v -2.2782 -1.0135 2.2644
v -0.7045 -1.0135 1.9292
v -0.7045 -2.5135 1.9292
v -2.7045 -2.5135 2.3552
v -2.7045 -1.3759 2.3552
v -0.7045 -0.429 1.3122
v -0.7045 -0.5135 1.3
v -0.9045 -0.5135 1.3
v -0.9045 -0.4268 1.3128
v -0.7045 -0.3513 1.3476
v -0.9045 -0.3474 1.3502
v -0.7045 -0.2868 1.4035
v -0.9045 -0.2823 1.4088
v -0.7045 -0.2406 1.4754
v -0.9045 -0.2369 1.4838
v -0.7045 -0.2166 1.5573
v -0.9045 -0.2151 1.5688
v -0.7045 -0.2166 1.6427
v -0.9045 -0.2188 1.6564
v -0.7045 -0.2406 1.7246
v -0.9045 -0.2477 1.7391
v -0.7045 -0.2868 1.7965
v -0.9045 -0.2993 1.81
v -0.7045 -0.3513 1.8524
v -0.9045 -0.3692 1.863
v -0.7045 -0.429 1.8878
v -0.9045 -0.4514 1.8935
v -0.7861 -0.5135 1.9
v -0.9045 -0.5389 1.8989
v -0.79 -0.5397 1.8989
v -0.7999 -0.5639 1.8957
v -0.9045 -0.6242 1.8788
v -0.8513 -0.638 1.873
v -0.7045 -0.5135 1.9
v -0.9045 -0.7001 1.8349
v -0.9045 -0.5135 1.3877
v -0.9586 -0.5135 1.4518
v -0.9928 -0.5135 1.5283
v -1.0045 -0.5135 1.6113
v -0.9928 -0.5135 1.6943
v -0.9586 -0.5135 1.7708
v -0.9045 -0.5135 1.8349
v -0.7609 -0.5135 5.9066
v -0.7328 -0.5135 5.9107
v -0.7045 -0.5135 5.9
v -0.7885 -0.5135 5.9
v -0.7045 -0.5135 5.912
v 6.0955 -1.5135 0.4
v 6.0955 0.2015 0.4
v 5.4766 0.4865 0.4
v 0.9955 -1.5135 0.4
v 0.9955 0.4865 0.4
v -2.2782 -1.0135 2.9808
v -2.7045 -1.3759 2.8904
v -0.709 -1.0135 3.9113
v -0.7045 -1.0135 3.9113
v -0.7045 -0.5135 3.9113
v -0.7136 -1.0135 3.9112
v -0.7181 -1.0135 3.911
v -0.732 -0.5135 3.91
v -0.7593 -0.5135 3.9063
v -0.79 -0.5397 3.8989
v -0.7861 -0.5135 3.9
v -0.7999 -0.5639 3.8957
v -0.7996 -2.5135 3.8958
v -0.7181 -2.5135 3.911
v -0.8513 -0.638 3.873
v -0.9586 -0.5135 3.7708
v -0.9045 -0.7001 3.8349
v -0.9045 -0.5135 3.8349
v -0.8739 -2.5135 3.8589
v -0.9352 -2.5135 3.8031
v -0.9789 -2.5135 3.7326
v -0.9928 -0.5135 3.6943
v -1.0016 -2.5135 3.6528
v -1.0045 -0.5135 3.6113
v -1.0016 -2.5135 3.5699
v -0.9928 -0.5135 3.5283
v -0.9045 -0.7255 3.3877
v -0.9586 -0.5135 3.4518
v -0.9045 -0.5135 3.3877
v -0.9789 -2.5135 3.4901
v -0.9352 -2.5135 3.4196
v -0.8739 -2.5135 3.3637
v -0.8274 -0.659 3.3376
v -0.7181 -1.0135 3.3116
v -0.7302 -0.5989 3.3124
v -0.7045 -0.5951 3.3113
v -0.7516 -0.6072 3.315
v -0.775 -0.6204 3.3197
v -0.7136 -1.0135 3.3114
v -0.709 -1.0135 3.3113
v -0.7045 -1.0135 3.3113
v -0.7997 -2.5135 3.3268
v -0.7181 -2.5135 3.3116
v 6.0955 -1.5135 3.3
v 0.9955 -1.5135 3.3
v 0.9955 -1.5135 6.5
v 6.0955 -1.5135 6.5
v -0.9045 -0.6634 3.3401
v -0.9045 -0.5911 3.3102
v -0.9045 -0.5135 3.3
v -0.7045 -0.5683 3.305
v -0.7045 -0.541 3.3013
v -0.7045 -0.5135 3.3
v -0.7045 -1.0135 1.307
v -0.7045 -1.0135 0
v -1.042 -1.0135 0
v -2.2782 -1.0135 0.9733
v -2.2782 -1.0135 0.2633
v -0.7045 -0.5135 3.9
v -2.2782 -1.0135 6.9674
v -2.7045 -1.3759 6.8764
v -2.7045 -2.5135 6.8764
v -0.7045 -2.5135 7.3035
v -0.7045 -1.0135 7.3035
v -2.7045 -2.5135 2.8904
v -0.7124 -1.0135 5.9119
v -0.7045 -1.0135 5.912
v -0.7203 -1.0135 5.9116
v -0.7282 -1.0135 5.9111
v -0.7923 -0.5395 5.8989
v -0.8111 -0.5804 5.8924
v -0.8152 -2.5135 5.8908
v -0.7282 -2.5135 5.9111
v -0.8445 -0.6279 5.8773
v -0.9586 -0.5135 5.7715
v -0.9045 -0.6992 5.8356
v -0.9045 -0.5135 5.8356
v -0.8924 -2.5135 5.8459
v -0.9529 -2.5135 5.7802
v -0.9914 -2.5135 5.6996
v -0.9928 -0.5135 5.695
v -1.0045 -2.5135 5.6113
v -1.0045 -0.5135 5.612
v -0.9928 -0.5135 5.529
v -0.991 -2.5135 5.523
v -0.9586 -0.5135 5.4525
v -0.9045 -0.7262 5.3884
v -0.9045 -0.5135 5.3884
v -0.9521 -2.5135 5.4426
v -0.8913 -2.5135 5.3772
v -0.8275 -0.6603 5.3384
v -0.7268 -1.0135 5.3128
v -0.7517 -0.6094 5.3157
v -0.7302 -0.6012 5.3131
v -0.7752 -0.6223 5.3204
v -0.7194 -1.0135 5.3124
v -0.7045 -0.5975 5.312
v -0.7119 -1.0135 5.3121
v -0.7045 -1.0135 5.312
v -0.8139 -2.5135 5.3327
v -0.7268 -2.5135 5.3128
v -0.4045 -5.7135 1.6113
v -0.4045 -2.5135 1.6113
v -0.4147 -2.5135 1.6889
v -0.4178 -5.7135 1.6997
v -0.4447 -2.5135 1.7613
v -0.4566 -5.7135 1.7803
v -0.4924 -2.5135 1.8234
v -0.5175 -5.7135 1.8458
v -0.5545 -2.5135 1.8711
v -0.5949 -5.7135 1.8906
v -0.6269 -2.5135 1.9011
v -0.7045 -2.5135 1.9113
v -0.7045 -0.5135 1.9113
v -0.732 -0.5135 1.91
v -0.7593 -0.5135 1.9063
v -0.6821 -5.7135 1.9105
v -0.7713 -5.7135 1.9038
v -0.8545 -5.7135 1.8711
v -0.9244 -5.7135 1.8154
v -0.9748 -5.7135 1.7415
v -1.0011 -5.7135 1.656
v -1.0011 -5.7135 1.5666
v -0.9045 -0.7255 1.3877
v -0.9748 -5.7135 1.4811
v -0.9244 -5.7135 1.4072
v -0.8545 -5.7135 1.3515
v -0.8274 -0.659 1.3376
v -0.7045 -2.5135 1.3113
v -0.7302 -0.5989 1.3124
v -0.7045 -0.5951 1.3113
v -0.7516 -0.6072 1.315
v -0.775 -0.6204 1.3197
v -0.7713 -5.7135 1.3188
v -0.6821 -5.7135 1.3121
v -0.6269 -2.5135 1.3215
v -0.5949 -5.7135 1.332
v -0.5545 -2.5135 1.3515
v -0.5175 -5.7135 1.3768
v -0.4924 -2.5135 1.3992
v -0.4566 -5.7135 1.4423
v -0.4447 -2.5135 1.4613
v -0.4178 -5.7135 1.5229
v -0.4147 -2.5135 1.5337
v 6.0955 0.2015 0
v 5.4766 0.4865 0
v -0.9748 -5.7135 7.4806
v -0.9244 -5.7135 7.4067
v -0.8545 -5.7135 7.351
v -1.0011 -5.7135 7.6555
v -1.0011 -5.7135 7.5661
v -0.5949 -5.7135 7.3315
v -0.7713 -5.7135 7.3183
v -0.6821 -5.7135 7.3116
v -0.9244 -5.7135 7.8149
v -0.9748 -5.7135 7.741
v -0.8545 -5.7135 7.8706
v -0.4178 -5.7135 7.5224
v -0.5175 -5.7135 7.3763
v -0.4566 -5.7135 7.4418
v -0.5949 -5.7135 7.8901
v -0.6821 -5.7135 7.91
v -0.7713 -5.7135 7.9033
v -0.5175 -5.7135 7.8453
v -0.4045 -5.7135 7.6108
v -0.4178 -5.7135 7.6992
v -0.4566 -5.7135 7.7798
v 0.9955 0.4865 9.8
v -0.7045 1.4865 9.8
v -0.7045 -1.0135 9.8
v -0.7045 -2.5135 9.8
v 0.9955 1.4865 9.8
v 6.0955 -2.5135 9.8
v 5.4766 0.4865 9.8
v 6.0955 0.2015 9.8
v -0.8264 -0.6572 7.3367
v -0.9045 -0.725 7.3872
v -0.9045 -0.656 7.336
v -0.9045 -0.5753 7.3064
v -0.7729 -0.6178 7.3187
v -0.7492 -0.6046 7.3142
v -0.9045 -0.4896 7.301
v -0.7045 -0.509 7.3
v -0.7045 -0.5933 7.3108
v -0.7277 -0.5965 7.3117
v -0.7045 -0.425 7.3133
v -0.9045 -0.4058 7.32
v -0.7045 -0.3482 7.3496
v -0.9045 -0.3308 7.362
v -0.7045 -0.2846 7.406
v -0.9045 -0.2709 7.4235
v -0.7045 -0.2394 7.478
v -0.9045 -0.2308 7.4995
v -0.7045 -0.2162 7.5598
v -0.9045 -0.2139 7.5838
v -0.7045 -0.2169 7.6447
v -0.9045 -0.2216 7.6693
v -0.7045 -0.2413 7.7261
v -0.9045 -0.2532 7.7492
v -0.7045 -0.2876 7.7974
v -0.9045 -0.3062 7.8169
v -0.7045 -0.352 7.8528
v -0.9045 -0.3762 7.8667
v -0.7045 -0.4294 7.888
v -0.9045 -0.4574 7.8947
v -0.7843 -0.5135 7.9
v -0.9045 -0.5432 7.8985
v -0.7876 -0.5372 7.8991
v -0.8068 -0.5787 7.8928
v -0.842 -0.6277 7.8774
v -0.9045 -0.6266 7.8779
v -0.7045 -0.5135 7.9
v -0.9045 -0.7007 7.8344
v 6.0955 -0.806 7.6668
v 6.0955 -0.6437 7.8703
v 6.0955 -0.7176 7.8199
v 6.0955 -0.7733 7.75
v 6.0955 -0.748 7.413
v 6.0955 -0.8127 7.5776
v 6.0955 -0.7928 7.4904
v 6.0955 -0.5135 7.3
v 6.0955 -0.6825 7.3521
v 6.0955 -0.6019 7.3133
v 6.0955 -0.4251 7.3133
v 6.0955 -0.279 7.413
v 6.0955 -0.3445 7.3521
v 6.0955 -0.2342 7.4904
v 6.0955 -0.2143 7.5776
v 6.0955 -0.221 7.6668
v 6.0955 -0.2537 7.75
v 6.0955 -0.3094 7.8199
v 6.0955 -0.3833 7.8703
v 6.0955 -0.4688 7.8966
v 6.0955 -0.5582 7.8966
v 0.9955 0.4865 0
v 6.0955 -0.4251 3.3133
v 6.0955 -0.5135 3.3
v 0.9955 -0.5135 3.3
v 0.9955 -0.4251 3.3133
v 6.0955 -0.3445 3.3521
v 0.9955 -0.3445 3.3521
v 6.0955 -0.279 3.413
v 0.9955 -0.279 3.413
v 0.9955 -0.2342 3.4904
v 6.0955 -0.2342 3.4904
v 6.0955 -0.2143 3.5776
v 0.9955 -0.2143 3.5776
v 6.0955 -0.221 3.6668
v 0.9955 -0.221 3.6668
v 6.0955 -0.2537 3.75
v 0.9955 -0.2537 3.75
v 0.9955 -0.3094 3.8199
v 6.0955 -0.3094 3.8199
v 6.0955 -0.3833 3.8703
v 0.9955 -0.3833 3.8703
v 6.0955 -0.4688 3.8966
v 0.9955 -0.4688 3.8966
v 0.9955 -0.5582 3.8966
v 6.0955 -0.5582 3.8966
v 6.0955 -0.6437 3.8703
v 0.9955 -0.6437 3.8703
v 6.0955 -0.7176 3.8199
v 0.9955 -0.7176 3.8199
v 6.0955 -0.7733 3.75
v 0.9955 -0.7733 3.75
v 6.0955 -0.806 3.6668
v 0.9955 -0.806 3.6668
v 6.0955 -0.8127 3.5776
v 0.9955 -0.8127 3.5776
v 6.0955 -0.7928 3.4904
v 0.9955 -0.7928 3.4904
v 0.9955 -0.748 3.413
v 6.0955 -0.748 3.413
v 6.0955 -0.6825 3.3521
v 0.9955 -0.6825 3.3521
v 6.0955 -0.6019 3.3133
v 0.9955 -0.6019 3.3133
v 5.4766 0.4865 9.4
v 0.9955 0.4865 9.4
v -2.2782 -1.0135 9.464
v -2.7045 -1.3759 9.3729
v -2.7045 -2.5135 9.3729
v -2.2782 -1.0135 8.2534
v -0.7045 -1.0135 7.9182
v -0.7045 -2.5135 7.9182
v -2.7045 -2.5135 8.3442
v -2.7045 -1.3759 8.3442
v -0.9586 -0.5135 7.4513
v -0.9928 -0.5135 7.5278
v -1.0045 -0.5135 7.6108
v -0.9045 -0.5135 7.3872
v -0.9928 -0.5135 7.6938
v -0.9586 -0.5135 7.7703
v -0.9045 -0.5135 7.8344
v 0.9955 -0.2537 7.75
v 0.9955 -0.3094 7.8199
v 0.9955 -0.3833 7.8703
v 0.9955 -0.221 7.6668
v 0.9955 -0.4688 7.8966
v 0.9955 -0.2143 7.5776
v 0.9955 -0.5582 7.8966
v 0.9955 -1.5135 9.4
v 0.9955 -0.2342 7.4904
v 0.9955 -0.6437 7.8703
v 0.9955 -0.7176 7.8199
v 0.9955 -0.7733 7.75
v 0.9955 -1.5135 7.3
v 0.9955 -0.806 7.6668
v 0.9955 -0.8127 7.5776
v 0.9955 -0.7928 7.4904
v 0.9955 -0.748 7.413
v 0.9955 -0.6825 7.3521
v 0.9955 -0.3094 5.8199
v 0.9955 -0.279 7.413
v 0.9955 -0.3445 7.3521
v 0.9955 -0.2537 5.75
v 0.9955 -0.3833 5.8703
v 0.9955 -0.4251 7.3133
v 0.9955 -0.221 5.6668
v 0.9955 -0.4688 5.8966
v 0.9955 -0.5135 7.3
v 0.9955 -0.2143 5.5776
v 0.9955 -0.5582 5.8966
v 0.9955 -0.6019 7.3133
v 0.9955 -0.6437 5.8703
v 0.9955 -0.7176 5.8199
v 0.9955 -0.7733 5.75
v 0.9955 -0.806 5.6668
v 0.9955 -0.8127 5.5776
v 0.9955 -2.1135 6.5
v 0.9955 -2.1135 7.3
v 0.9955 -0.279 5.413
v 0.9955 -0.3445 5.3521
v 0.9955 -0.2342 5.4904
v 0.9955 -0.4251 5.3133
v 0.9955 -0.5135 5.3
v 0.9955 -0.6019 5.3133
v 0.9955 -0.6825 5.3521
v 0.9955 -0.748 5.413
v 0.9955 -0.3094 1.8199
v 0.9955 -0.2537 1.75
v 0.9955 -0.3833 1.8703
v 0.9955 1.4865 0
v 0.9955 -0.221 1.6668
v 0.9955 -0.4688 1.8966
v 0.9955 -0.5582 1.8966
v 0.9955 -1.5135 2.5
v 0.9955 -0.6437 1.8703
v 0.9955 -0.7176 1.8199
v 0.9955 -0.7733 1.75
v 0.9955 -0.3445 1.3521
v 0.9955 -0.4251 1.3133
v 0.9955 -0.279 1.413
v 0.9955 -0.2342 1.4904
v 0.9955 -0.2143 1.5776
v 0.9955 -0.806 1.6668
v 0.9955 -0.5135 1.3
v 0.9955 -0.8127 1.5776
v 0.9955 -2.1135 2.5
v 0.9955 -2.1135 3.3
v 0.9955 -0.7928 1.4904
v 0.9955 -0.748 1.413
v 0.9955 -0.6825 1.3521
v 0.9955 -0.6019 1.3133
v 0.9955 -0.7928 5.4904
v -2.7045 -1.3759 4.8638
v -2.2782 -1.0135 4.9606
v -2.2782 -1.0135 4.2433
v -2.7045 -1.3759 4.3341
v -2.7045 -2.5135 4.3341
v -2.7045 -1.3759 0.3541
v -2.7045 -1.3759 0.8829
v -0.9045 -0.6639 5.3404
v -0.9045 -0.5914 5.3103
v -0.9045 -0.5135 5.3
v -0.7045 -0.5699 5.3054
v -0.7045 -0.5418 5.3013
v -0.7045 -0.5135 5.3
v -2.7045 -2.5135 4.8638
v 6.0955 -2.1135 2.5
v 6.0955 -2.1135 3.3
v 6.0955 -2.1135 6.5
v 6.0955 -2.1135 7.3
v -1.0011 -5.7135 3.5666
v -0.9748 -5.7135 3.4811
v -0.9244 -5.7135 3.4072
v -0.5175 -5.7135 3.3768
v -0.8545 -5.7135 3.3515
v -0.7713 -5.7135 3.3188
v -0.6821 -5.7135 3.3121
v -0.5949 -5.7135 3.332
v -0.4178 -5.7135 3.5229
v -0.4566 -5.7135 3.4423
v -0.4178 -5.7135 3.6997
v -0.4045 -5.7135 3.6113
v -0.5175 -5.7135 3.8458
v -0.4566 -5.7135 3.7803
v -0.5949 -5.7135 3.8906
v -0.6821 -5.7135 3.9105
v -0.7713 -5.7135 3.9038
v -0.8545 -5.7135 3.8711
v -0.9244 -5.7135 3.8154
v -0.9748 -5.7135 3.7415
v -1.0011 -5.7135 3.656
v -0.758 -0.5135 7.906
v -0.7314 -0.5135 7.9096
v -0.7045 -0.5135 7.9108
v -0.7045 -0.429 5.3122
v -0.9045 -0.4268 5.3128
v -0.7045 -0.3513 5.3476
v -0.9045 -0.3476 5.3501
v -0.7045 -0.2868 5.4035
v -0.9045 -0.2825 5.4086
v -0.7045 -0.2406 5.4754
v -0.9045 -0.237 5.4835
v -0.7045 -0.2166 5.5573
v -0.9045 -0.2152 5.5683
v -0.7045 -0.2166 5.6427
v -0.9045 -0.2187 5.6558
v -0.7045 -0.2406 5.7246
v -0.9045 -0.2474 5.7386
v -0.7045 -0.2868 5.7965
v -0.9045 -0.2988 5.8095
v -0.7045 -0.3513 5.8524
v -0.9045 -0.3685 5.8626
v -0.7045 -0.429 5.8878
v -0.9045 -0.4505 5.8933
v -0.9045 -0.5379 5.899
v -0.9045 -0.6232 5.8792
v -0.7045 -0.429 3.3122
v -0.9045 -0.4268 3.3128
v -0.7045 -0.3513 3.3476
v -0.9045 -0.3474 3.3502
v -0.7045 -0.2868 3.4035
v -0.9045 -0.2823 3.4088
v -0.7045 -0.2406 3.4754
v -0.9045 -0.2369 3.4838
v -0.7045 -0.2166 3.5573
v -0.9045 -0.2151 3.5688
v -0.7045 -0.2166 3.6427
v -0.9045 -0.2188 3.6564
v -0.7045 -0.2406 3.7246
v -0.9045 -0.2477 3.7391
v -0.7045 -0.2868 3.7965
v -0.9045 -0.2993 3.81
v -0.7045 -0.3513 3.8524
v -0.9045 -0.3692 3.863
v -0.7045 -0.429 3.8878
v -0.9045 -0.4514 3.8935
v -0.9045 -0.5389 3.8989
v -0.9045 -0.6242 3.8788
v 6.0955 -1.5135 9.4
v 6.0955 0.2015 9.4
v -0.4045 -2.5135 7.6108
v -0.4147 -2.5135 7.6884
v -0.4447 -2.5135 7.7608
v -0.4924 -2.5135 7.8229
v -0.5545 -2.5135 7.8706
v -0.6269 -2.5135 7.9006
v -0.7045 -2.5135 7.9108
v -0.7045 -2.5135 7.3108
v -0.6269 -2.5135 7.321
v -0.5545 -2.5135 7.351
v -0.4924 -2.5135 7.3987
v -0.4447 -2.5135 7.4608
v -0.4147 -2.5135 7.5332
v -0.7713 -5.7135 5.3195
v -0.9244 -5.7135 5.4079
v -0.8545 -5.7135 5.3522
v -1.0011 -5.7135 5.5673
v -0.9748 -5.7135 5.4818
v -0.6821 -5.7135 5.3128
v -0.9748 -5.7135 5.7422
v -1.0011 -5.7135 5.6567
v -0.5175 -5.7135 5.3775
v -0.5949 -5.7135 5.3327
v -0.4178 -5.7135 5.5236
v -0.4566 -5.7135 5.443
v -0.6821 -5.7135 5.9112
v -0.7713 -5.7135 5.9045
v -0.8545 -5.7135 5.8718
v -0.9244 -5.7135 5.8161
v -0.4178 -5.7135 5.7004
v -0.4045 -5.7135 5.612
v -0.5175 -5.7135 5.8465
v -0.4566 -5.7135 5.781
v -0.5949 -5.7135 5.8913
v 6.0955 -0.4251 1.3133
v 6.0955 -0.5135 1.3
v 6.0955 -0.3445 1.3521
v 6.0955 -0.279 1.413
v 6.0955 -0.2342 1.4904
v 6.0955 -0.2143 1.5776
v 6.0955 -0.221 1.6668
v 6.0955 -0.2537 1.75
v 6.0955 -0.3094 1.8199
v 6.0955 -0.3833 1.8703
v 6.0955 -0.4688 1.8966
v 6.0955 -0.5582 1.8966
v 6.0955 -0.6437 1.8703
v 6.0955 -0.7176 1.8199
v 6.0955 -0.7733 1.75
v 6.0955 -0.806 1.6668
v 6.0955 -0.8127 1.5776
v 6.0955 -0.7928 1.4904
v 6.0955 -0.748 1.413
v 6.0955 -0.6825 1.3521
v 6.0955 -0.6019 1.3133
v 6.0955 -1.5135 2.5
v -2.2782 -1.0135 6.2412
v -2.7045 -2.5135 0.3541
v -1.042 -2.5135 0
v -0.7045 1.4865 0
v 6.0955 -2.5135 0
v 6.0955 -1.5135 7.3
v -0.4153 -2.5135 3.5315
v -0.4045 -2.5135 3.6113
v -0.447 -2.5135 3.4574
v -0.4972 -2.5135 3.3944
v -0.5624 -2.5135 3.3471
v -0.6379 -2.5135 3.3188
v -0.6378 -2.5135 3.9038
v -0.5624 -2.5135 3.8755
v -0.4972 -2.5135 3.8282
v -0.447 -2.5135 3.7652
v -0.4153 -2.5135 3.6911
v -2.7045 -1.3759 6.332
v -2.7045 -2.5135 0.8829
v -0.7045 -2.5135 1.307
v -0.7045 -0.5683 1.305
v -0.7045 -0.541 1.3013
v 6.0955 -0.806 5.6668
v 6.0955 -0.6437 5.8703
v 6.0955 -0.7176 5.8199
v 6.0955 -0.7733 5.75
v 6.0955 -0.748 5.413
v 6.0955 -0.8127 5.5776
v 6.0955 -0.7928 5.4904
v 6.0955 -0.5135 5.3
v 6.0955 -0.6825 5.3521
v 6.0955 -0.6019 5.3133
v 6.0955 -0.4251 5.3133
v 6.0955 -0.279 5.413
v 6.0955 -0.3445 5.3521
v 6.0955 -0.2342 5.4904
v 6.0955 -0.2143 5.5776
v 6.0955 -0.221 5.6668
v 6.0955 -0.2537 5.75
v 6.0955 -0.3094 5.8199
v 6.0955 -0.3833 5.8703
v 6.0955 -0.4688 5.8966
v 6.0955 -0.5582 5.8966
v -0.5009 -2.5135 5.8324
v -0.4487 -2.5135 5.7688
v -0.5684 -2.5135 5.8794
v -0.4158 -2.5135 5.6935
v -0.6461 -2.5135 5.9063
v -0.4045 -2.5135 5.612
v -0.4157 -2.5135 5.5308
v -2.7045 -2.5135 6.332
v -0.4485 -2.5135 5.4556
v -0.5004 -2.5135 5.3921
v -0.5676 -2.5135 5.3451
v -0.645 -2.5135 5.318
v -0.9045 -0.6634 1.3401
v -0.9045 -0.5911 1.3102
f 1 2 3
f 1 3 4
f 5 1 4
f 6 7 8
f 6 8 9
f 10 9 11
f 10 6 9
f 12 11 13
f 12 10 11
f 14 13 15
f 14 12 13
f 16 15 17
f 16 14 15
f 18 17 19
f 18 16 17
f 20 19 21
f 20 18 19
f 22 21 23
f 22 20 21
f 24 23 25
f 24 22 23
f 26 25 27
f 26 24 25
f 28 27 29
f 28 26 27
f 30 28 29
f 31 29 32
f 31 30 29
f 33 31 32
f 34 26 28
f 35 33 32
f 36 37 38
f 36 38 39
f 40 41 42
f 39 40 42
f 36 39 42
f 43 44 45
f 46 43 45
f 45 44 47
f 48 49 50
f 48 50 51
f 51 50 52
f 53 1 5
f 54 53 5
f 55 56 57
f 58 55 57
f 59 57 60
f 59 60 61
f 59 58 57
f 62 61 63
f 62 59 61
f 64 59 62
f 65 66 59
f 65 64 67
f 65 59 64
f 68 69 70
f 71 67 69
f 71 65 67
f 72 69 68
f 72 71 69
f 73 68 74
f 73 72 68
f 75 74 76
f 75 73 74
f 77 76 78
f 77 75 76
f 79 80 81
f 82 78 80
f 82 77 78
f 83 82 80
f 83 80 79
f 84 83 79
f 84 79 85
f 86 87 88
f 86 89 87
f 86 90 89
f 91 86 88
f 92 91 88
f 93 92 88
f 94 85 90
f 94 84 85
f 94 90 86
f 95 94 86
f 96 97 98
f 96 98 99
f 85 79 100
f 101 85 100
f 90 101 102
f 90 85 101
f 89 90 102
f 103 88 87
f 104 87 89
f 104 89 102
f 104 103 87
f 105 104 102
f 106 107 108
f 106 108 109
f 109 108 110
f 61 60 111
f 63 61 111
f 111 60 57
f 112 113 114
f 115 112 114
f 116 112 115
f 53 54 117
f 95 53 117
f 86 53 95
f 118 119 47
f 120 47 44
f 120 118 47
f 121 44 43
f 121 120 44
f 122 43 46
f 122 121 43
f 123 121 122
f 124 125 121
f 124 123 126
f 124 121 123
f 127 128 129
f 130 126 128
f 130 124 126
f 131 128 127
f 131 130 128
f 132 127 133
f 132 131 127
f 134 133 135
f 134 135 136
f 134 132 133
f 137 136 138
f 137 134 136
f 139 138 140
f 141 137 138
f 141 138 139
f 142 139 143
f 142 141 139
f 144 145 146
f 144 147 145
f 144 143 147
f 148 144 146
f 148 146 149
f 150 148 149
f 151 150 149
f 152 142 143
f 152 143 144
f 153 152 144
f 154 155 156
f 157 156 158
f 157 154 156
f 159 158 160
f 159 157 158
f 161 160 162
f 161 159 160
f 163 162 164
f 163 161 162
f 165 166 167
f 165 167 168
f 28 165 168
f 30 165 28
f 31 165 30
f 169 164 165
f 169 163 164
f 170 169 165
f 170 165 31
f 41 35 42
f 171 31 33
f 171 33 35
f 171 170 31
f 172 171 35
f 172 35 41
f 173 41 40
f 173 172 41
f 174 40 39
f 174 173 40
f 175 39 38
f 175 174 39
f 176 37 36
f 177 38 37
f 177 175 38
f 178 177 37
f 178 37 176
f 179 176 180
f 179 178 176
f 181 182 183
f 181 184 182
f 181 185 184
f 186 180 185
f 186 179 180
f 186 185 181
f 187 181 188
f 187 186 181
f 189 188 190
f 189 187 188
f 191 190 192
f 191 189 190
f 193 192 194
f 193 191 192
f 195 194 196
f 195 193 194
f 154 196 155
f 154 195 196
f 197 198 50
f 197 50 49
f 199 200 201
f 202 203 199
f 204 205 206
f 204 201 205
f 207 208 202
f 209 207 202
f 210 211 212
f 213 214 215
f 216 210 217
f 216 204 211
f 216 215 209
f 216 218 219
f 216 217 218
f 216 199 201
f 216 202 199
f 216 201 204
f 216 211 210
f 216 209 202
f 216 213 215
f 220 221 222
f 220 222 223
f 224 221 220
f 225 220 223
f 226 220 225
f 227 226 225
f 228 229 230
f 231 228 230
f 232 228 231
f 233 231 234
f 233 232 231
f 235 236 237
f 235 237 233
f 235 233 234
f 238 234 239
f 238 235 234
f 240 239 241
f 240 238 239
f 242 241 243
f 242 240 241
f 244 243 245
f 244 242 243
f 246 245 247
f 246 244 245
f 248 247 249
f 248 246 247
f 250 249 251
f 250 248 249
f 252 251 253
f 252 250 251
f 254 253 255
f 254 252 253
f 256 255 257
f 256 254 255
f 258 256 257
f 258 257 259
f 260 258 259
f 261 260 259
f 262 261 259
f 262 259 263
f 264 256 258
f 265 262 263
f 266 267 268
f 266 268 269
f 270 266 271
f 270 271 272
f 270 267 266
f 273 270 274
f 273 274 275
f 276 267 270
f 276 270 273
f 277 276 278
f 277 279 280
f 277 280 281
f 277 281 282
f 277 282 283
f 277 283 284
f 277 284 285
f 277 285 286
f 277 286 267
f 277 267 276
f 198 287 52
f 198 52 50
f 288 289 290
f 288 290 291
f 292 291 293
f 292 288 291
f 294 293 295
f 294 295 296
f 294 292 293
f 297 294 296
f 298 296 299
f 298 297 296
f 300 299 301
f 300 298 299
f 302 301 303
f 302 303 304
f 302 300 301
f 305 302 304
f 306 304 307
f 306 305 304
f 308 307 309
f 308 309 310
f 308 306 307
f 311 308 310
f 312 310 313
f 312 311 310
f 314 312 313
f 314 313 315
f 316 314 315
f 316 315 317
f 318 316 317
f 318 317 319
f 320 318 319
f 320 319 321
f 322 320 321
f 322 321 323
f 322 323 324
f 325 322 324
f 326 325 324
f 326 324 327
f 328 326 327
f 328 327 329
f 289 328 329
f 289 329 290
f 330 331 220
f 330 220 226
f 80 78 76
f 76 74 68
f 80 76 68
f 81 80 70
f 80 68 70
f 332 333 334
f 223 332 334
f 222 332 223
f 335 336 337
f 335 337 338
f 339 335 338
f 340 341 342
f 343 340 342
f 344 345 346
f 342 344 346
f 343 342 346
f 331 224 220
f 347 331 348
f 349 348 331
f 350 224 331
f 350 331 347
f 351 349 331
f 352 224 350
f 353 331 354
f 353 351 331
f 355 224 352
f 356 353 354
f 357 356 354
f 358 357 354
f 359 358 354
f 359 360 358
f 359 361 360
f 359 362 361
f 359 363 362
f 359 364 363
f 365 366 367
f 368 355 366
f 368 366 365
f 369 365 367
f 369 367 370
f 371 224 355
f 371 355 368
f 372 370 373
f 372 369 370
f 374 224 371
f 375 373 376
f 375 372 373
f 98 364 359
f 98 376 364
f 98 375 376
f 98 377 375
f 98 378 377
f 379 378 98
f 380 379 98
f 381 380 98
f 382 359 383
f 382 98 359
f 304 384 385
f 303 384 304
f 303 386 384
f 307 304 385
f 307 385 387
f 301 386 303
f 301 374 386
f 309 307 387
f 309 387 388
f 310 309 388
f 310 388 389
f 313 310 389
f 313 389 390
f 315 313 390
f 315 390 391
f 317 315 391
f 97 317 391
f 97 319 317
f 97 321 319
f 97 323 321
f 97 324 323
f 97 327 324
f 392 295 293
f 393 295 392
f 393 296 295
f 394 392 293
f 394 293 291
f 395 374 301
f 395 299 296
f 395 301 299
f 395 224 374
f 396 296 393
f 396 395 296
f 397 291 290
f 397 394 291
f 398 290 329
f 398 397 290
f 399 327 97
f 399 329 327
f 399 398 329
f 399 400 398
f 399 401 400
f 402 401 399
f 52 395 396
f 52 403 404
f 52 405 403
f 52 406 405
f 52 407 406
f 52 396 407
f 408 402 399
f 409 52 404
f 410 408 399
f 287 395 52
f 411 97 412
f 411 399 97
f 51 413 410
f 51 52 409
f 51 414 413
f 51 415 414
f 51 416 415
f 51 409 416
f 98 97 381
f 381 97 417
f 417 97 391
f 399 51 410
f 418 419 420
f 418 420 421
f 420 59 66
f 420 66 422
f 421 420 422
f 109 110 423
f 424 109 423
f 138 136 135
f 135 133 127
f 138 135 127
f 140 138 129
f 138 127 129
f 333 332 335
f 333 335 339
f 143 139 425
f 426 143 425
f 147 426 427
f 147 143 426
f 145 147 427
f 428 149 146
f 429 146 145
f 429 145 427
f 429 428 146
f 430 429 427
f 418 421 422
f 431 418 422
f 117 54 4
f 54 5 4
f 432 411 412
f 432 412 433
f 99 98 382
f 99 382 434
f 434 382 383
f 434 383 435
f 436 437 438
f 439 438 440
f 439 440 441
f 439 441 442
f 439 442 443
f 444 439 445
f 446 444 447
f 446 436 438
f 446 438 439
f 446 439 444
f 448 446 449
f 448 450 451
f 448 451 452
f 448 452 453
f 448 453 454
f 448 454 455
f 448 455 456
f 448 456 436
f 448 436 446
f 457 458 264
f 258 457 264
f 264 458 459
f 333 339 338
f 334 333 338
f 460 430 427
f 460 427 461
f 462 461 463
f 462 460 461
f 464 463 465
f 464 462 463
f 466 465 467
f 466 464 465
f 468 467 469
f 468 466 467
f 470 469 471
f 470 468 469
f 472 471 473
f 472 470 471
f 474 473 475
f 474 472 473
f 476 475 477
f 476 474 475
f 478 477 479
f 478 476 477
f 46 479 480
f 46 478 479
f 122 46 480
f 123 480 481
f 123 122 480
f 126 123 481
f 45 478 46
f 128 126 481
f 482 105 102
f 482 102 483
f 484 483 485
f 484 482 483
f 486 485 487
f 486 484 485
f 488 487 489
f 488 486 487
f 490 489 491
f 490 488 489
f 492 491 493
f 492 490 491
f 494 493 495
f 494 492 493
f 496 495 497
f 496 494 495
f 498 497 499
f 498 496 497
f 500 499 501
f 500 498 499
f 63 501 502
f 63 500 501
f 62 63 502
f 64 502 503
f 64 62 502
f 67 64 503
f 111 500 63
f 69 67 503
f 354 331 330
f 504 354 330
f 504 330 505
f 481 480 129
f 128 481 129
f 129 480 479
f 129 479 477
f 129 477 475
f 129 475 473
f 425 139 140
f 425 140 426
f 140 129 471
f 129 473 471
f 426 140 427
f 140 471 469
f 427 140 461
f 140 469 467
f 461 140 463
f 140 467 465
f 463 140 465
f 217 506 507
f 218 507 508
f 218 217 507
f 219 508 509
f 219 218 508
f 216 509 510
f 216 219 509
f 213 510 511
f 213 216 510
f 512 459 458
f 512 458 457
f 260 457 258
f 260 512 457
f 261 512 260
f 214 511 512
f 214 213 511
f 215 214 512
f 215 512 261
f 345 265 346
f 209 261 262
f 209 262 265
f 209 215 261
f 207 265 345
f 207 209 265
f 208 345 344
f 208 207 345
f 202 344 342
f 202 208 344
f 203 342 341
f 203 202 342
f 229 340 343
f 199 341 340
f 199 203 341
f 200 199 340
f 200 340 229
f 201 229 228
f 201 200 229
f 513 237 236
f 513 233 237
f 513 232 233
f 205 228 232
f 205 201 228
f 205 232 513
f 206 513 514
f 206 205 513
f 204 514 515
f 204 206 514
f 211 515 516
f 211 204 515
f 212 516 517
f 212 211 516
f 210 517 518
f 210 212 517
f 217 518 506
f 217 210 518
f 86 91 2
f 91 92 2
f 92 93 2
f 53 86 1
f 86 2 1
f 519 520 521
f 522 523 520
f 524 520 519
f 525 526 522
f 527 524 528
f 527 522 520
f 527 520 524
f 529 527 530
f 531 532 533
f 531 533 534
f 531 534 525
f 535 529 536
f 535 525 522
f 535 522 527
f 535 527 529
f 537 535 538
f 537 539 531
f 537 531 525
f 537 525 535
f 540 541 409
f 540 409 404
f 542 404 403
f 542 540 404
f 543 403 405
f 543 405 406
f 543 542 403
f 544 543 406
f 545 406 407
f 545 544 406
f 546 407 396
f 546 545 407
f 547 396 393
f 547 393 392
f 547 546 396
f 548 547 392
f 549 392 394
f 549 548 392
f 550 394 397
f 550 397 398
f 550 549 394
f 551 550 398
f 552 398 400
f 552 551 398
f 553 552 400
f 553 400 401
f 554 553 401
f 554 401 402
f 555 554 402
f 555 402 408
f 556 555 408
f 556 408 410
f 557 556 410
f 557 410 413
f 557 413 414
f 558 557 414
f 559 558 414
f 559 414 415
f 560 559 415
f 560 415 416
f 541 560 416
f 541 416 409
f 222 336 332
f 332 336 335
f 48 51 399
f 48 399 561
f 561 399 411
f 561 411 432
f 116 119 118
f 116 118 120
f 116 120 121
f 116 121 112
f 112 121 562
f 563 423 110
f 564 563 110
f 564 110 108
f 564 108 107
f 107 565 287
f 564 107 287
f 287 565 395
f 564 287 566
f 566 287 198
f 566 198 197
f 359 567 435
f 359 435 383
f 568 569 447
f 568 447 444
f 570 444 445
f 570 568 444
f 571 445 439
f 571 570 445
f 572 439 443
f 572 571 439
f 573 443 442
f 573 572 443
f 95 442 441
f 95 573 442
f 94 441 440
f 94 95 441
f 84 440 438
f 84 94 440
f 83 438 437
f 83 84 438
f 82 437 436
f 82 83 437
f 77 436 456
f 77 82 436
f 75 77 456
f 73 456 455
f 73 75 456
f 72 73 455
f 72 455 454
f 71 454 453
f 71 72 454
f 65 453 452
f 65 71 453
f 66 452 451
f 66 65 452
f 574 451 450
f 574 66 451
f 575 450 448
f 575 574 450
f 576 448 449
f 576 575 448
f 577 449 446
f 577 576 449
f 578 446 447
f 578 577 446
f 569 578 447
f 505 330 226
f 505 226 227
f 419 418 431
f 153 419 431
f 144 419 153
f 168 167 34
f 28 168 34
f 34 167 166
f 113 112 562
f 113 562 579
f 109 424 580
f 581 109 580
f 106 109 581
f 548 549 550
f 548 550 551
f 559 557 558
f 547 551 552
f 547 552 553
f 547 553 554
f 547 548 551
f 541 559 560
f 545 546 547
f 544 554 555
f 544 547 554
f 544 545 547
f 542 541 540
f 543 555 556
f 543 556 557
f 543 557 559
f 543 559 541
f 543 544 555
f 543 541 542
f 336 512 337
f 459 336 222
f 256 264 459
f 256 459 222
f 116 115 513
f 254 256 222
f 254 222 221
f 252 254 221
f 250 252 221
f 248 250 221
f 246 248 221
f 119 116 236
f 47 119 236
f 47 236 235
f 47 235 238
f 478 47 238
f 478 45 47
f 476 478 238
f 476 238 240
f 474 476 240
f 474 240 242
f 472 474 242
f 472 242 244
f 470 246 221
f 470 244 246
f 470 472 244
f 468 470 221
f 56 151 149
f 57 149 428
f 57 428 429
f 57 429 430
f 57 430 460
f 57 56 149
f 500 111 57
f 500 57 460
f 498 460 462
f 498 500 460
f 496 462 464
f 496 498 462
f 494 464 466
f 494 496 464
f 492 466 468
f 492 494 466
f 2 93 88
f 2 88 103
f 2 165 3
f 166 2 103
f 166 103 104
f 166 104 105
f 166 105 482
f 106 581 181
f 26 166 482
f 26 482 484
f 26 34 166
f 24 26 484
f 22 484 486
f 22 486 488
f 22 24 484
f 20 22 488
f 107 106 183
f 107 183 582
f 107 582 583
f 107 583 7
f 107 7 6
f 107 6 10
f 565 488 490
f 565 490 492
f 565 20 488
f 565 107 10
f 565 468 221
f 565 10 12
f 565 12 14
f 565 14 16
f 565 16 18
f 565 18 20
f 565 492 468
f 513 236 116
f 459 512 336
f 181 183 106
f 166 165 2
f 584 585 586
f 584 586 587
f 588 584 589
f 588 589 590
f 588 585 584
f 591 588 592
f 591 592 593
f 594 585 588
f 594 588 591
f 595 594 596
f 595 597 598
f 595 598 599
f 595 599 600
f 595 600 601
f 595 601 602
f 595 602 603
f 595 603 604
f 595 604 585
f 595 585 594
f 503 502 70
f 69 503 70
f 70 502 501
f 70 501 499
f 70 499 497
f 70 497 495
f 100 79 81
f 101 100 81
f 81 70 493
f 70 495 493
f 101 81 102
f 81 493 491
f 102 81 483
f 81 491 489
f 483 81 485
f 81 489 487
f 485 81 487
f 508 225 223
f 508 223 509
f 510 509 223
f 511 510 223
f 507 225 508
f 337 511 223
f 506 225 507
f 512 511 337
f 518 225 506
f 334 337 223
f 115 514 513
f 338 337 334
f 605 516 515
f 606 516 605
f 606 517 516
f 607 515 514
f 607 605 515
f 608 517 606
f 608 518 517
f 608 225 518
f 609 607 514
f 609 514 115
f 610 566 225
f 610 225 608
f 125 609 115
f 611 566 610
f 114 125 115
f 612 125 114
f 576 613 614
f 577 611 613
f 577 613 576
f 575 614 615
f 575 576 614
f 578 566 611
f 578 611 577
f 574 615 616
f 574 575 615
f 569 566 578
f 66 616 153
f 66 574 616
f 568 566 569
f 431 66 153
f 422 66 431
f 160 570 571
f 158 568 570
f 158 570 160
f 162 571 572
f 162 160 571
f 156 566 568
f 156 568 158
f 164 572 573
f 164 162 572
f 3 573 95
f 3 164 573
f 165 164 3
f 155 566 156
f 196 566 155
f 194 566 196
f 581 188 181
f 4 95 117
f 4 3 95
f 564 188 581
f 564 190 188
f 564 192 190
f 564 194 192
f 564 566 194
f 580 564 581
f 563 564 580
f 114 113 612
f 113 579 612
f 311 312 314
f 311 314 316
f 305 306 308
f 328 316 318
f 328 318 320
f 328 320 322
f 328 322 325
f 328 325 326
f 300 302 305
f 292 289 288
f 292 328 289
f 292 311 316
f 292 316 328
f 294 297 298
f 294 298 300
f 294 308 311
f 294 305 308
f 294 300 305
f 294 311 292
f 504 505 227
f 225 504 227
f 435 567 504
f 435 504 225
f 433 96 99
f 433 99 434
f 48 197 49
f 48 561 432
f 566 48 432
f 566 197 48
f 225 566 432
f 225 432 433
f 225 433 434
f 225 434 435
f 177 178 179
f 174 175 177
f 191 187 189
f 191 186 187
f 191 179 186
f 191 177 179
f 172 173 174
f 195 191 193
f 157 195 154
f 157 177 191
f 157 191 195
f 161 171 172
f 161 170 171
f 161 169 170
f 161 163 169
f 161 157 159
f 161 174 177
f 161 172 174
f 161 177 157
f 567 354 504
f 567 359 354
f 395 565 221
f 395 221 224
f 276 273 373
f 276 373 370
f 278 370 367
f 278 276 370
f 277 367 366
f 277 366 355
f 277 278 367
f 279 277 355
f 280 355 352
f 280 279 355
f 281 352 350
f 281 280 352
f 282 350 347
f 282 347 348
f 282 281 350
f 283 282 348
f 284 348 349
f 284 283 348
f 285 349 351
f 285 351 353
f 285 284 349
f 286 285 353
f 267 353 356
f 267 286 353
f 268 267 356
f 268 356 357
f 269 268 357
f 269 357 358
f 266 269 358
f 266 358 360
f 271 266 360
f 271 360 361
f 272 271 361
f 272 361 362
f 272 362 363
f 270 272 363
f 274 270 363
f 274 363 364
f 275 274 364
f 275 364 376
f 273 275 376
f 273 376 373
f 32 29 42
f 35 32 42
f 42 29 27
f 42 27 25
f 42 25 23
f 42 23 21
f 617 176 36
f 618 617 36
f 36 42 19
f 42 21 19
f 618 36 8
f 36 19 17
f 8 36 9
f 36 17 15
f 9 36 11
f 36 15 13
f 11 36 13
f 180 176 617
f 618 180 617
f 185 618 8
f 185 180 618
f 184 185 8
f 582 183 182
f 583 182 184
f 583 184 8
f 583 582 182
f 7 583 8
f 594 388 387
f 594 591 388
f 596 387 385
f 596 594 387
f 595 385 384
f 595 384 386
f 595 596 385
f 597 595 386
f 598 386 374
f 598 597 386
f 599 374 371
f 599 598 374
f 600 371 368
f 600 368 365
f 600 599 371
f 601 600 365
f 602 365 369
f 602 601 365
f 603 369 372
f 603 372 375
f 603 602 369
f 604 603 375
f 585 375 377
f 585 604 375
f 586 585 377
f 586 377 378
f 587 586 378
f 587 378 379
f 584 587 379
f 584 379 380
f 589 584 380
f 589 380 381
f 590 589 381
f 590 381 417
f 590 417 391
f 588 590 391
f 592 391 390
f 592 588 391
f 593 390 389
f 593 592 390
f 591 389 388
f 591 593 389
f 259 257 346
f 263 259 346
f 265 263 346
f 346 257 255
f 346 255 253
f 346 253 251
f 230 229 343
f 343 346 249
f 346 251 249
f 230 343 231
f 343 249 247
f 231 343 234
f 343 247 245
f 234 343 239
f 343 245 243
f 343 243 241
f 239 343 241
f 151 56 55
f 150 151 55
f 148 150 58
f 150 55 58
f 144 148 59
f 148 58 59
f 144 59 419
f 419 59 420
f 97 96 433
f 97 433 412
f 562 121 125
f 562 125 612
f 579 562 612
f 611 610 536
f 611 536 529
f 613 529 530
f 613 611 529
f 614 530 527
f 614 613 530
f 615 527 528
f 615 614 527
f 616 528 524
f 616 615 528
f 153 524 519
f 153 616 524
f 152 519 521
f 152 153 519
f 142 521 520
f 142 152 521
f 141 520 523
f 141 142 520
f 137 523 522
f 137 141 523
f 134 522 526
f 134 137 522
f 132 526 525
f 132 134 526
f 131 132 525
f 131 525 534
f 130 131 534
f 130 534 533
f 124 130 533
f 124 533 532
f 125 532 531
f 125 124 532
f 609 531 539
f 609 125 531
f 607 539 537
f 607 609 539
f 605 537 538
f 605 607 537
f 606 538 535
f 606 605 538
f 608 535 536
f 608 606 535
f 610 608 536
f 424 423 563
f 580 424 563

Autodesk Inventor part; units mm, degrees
ref_plane "YZ Plane" through (0, 0, 0) normal (1, 0, 0) x (0, 1, 0)
ref_plane "XZ Plane" through (0, 0, 0) normal (0, 1, 0) x (-1, 0, 0)
ref_plane "XY Plane" through (0, 0, 0) normal (0, 0, 1) x (1, 0, 0)
sketch "Sketch1" plane through (0, 0, 0) normal (0, 0, 1) x (1, 0, 0)
  line L0 (-0.7045, 1.4865) -> (6.0955, 1.4865)
  line L1 (6.0955, 1.4865) -> (6.0955, -2.5135)
  line L2 (6.0955, -2.5135) -> (-0.7045, -2.5135)
  line L3 (-0.7045, -2.5135) -> (-0.7045, 1.4865)
  line L4 (0.9955, 1.4865) -> (0.9955, 0.4865)
  line L5 (0.9955, 0.4865) -> (5.4766, 0.4865)
  line L6 (5.4766, 0.4865) -> (6.0955, 0.2015)
  line L7 (-0.7045, -1.0135) -> (-2.2782, -1.0135)
  line L8 (-2.2782, -1.0135) -> (-2.7045, -1.3759)
  line L9 (-2.7045, -1.3759) -> (-2.7045, -2.5135)
  line L10 (-2.7045, -2.5135) -> (-0.7045, -2.5135)
  point P0 (0, 0)
  dimension "d0" = 6.8
  dimension "d1" = 4
  dimension "d2" = 1.7
  dimension "d3" = 1
  dimension "d4" = 8.8
  dimension "d5" = 1.5
extrude "Extrusion1" add sketch "Sketch1" along normal blind 9.8 contours L0 L4 L5 L6 L1 L2 L3 | L3 L10 L9 L8 L7
sketch "Sketch2" plane through (0.9955, 0.4865, 0) normal (0, 1, 0) x (1, 0, 0)
  line L0 (0, 0) -> (0, -9.8) projected
  line L1 (4.4812, -9.8) -> (0, -9.8) projected
  line L2 (6, -0.4) -> (0, -0.4)
  line L3 (0, -0.4) -> (0, -9.4)
  line L4 (0, -9.4) -> (6, -9.4)
  line L5 (6, -9.4) -> (6, -0.4)
  point P0 (-0.9955, 0)
  dimension "d8" = 9
  dimension "d9" = 0.4
  dimension "d10" = 6
extrude "Extrusion2" cut sketch "Sketch2" against normal blind 2
sketch "Sketch3" plane through (0.9955, -1.5135, 0) normal (0, 1, 0) x (1, 0, 0)
  line L0 (0, -9.4) -> (0, -0.4) projected
  line L1 (0, -6.5) -> (5.6296, -6.5)
  line L2 (5.6296, -6.5) -> (5.6296, -7.3)
  line L3 (5.6296, -7.3) -> (0, -7.3)
  line L4 (0, -7.3) -> (0, -6.5)
  line L5 (0, -2.5) -> (5.6296, -2.5)
  line L6 (5.6296, -2.5) -> (5.6296, -3.3)
  line L7 (5.6296, -3.3) -> (0, -3.3)
  line L8 (0, -3.3) -> (0, -2.5)
  line L9 (4.4812, -9.8) -> (0, -9.8) projected
  point P0 (-0.9955, 0)
  dimension "d13" = 0.8
  dimension "d14" = 0.8
  dimension "d15" = 3.2
  dimension "d16" = 3.3
extrude "Extrusion3" cut sketch "Sketch3" against normal blind 0.6
sketch "Sketch6" plane through (6.0955, -2.5135, 0) normal (1, 0, 0) x (0, 0, -1)
  line L0 (-3.3, 1) -> (-6.5, 1) projected
  line L1 (-7.3, 1) -> (-9.4, 1) projected
  line L2 (-9.8, 0) -> (-9.8, 2.715) projected
  line L3 (-0.4, 1) -> (-2.5, 1) projected
  circle A0 centre (-7.6, 2) radius 0.3
  circle A1 centre (-5.6, 2) radius 0.3
  circle A2 centre (-3.6, 2) radius 0.3
  circle A3 centre (-1.6, 2) radius 0.3
  point P0 (0, 2.5135)
  dimension "d21" = 2.2
  dimension "d22" = 2
  dimension "d23" = 2
  dimension "d24" = 2
  dimension "d25" = 1
  dimension "d26" = 1
  dimension "d27" = 1
  dimension "d28" = 1
  dimension "d29" = 0.6
  dimension "d30" = 0.6
  dimension "d31" = 0.6
  dimension "d32" = 0.6
extrude "Extrusion4" add sketch "Sketch6" against normal blind 7
sketch "Sketch8" plane through (-2.2782, -1.0135, 0) normal (0, 1, 0) x (1, 0, 0)
  line L0 (1.5737, 0) -> (0, 0) projected
  line L1 (1.5737, 0) -> (1.5737, -9.8) projected
  line L2 (1.5737, -9.8) -> (-2.262, -9.8)
  line L3 (-2.262, -9.8) -> (-2.2372, 0)
  line L4 (-2.2372, 0) -> (1.2362, 0)
  line L5 (-0.8777, -0.4503) -> (1.2362, 0)
  line L6 (-0.8777, -0.4503) -> (-0.8777, -0.7872)
  line L7 (-0.8777, -0.7872) -> (1.5737, -1.307)
  line L8 (1.5737, -1.307) -> (1.5737, -1.9292)
  line L9 (1.5737, -1.9292) -> (-0.9327, -2.463)
  line L10 (-0.9327, -2.463) -> (-0.9327, -2.783)
  line L11 (-0.9327, -2.783) -> (1.5737, -3.3145)
  line L12 (1.5737, -3.3145) -> (1.5737, -3.9081)
  line L13 (1.5737, -3.9081) -> (-1.0204, -4.4607)
  line L14 (-1.0204, -4.4607) -> (-1.0204, -4.7289)
  line L15 (-1.0204, -4.7289) -> (1.5737, -5.3179)
  line L16 (1.5737, -5.3179) -> (1.5737, -5.906)
  line L17 (1.5737, -5.906) -> (-0.9385, -6.4411)
  line L18 (-0.9385, -6.4411) -> (-0.9385, -6.767)
  line L19 (-0.9385, -6.767) -> (1.5737, -7.3035)
  line L20 (1.5737, -7.3035) -> (1.5737, -7.9182)
  line L21 (1.5737, -7.9182) -> (-1.0783, -8.4831)
  line L22 (-1.0783, -8.4831) -> (-1.0783, -9.2337)
  line L23 (-1.0783, -9.2337) -> (1.5737, -9.8)
  point P0 (2.2782, 0)
extrude "Extrusion5" cut sketch "Sketch8" against normal through all contours L5 L6 L7 L1 L9 L10 L11 L13 L14 L15 L17 L18 L19 L21 L22 L23 L2 L3 L4 L0
sketch "Sketch9" plane through (6.0955, -2.5135, 0) normal (0, -1, 0) x (1, 0, 0)
  line L0 (-6.8, 5.906) -> (-6.8, 5.3179) projected
  line L1 (-6.8, 3.9081) -> (-6.8, 3.3145) projected
  line L2 (-6.8, 1.9292) -> (-6.8, 1.307) projected
  line L3 (-6.8, 7.9182) -> (-6.8, 7.3035) projected
  circle A0 centre (-6.8, 1.6113) radius 0.3
  circle A1 centre (-6.8, 7.6108) radius 0.3
  circle A2 centre (-6.8, 5.612) radius 0.3
  circle A3 centre (-6.8, 3.6113) radius 0.3
  point P0 (-6.0955, 0)
  dimension "d54" = 0.6
  dimension "d56" = 0.6
  dimension "d57" = 0.6
  dimension "d58" = 0.6
  dimension "d59" = 2
extrude "Extrusion6" add sketch "Sketch9" along normal blind 3.2 and the other way blind 2
properties part number "2mmWireBoardConn"
